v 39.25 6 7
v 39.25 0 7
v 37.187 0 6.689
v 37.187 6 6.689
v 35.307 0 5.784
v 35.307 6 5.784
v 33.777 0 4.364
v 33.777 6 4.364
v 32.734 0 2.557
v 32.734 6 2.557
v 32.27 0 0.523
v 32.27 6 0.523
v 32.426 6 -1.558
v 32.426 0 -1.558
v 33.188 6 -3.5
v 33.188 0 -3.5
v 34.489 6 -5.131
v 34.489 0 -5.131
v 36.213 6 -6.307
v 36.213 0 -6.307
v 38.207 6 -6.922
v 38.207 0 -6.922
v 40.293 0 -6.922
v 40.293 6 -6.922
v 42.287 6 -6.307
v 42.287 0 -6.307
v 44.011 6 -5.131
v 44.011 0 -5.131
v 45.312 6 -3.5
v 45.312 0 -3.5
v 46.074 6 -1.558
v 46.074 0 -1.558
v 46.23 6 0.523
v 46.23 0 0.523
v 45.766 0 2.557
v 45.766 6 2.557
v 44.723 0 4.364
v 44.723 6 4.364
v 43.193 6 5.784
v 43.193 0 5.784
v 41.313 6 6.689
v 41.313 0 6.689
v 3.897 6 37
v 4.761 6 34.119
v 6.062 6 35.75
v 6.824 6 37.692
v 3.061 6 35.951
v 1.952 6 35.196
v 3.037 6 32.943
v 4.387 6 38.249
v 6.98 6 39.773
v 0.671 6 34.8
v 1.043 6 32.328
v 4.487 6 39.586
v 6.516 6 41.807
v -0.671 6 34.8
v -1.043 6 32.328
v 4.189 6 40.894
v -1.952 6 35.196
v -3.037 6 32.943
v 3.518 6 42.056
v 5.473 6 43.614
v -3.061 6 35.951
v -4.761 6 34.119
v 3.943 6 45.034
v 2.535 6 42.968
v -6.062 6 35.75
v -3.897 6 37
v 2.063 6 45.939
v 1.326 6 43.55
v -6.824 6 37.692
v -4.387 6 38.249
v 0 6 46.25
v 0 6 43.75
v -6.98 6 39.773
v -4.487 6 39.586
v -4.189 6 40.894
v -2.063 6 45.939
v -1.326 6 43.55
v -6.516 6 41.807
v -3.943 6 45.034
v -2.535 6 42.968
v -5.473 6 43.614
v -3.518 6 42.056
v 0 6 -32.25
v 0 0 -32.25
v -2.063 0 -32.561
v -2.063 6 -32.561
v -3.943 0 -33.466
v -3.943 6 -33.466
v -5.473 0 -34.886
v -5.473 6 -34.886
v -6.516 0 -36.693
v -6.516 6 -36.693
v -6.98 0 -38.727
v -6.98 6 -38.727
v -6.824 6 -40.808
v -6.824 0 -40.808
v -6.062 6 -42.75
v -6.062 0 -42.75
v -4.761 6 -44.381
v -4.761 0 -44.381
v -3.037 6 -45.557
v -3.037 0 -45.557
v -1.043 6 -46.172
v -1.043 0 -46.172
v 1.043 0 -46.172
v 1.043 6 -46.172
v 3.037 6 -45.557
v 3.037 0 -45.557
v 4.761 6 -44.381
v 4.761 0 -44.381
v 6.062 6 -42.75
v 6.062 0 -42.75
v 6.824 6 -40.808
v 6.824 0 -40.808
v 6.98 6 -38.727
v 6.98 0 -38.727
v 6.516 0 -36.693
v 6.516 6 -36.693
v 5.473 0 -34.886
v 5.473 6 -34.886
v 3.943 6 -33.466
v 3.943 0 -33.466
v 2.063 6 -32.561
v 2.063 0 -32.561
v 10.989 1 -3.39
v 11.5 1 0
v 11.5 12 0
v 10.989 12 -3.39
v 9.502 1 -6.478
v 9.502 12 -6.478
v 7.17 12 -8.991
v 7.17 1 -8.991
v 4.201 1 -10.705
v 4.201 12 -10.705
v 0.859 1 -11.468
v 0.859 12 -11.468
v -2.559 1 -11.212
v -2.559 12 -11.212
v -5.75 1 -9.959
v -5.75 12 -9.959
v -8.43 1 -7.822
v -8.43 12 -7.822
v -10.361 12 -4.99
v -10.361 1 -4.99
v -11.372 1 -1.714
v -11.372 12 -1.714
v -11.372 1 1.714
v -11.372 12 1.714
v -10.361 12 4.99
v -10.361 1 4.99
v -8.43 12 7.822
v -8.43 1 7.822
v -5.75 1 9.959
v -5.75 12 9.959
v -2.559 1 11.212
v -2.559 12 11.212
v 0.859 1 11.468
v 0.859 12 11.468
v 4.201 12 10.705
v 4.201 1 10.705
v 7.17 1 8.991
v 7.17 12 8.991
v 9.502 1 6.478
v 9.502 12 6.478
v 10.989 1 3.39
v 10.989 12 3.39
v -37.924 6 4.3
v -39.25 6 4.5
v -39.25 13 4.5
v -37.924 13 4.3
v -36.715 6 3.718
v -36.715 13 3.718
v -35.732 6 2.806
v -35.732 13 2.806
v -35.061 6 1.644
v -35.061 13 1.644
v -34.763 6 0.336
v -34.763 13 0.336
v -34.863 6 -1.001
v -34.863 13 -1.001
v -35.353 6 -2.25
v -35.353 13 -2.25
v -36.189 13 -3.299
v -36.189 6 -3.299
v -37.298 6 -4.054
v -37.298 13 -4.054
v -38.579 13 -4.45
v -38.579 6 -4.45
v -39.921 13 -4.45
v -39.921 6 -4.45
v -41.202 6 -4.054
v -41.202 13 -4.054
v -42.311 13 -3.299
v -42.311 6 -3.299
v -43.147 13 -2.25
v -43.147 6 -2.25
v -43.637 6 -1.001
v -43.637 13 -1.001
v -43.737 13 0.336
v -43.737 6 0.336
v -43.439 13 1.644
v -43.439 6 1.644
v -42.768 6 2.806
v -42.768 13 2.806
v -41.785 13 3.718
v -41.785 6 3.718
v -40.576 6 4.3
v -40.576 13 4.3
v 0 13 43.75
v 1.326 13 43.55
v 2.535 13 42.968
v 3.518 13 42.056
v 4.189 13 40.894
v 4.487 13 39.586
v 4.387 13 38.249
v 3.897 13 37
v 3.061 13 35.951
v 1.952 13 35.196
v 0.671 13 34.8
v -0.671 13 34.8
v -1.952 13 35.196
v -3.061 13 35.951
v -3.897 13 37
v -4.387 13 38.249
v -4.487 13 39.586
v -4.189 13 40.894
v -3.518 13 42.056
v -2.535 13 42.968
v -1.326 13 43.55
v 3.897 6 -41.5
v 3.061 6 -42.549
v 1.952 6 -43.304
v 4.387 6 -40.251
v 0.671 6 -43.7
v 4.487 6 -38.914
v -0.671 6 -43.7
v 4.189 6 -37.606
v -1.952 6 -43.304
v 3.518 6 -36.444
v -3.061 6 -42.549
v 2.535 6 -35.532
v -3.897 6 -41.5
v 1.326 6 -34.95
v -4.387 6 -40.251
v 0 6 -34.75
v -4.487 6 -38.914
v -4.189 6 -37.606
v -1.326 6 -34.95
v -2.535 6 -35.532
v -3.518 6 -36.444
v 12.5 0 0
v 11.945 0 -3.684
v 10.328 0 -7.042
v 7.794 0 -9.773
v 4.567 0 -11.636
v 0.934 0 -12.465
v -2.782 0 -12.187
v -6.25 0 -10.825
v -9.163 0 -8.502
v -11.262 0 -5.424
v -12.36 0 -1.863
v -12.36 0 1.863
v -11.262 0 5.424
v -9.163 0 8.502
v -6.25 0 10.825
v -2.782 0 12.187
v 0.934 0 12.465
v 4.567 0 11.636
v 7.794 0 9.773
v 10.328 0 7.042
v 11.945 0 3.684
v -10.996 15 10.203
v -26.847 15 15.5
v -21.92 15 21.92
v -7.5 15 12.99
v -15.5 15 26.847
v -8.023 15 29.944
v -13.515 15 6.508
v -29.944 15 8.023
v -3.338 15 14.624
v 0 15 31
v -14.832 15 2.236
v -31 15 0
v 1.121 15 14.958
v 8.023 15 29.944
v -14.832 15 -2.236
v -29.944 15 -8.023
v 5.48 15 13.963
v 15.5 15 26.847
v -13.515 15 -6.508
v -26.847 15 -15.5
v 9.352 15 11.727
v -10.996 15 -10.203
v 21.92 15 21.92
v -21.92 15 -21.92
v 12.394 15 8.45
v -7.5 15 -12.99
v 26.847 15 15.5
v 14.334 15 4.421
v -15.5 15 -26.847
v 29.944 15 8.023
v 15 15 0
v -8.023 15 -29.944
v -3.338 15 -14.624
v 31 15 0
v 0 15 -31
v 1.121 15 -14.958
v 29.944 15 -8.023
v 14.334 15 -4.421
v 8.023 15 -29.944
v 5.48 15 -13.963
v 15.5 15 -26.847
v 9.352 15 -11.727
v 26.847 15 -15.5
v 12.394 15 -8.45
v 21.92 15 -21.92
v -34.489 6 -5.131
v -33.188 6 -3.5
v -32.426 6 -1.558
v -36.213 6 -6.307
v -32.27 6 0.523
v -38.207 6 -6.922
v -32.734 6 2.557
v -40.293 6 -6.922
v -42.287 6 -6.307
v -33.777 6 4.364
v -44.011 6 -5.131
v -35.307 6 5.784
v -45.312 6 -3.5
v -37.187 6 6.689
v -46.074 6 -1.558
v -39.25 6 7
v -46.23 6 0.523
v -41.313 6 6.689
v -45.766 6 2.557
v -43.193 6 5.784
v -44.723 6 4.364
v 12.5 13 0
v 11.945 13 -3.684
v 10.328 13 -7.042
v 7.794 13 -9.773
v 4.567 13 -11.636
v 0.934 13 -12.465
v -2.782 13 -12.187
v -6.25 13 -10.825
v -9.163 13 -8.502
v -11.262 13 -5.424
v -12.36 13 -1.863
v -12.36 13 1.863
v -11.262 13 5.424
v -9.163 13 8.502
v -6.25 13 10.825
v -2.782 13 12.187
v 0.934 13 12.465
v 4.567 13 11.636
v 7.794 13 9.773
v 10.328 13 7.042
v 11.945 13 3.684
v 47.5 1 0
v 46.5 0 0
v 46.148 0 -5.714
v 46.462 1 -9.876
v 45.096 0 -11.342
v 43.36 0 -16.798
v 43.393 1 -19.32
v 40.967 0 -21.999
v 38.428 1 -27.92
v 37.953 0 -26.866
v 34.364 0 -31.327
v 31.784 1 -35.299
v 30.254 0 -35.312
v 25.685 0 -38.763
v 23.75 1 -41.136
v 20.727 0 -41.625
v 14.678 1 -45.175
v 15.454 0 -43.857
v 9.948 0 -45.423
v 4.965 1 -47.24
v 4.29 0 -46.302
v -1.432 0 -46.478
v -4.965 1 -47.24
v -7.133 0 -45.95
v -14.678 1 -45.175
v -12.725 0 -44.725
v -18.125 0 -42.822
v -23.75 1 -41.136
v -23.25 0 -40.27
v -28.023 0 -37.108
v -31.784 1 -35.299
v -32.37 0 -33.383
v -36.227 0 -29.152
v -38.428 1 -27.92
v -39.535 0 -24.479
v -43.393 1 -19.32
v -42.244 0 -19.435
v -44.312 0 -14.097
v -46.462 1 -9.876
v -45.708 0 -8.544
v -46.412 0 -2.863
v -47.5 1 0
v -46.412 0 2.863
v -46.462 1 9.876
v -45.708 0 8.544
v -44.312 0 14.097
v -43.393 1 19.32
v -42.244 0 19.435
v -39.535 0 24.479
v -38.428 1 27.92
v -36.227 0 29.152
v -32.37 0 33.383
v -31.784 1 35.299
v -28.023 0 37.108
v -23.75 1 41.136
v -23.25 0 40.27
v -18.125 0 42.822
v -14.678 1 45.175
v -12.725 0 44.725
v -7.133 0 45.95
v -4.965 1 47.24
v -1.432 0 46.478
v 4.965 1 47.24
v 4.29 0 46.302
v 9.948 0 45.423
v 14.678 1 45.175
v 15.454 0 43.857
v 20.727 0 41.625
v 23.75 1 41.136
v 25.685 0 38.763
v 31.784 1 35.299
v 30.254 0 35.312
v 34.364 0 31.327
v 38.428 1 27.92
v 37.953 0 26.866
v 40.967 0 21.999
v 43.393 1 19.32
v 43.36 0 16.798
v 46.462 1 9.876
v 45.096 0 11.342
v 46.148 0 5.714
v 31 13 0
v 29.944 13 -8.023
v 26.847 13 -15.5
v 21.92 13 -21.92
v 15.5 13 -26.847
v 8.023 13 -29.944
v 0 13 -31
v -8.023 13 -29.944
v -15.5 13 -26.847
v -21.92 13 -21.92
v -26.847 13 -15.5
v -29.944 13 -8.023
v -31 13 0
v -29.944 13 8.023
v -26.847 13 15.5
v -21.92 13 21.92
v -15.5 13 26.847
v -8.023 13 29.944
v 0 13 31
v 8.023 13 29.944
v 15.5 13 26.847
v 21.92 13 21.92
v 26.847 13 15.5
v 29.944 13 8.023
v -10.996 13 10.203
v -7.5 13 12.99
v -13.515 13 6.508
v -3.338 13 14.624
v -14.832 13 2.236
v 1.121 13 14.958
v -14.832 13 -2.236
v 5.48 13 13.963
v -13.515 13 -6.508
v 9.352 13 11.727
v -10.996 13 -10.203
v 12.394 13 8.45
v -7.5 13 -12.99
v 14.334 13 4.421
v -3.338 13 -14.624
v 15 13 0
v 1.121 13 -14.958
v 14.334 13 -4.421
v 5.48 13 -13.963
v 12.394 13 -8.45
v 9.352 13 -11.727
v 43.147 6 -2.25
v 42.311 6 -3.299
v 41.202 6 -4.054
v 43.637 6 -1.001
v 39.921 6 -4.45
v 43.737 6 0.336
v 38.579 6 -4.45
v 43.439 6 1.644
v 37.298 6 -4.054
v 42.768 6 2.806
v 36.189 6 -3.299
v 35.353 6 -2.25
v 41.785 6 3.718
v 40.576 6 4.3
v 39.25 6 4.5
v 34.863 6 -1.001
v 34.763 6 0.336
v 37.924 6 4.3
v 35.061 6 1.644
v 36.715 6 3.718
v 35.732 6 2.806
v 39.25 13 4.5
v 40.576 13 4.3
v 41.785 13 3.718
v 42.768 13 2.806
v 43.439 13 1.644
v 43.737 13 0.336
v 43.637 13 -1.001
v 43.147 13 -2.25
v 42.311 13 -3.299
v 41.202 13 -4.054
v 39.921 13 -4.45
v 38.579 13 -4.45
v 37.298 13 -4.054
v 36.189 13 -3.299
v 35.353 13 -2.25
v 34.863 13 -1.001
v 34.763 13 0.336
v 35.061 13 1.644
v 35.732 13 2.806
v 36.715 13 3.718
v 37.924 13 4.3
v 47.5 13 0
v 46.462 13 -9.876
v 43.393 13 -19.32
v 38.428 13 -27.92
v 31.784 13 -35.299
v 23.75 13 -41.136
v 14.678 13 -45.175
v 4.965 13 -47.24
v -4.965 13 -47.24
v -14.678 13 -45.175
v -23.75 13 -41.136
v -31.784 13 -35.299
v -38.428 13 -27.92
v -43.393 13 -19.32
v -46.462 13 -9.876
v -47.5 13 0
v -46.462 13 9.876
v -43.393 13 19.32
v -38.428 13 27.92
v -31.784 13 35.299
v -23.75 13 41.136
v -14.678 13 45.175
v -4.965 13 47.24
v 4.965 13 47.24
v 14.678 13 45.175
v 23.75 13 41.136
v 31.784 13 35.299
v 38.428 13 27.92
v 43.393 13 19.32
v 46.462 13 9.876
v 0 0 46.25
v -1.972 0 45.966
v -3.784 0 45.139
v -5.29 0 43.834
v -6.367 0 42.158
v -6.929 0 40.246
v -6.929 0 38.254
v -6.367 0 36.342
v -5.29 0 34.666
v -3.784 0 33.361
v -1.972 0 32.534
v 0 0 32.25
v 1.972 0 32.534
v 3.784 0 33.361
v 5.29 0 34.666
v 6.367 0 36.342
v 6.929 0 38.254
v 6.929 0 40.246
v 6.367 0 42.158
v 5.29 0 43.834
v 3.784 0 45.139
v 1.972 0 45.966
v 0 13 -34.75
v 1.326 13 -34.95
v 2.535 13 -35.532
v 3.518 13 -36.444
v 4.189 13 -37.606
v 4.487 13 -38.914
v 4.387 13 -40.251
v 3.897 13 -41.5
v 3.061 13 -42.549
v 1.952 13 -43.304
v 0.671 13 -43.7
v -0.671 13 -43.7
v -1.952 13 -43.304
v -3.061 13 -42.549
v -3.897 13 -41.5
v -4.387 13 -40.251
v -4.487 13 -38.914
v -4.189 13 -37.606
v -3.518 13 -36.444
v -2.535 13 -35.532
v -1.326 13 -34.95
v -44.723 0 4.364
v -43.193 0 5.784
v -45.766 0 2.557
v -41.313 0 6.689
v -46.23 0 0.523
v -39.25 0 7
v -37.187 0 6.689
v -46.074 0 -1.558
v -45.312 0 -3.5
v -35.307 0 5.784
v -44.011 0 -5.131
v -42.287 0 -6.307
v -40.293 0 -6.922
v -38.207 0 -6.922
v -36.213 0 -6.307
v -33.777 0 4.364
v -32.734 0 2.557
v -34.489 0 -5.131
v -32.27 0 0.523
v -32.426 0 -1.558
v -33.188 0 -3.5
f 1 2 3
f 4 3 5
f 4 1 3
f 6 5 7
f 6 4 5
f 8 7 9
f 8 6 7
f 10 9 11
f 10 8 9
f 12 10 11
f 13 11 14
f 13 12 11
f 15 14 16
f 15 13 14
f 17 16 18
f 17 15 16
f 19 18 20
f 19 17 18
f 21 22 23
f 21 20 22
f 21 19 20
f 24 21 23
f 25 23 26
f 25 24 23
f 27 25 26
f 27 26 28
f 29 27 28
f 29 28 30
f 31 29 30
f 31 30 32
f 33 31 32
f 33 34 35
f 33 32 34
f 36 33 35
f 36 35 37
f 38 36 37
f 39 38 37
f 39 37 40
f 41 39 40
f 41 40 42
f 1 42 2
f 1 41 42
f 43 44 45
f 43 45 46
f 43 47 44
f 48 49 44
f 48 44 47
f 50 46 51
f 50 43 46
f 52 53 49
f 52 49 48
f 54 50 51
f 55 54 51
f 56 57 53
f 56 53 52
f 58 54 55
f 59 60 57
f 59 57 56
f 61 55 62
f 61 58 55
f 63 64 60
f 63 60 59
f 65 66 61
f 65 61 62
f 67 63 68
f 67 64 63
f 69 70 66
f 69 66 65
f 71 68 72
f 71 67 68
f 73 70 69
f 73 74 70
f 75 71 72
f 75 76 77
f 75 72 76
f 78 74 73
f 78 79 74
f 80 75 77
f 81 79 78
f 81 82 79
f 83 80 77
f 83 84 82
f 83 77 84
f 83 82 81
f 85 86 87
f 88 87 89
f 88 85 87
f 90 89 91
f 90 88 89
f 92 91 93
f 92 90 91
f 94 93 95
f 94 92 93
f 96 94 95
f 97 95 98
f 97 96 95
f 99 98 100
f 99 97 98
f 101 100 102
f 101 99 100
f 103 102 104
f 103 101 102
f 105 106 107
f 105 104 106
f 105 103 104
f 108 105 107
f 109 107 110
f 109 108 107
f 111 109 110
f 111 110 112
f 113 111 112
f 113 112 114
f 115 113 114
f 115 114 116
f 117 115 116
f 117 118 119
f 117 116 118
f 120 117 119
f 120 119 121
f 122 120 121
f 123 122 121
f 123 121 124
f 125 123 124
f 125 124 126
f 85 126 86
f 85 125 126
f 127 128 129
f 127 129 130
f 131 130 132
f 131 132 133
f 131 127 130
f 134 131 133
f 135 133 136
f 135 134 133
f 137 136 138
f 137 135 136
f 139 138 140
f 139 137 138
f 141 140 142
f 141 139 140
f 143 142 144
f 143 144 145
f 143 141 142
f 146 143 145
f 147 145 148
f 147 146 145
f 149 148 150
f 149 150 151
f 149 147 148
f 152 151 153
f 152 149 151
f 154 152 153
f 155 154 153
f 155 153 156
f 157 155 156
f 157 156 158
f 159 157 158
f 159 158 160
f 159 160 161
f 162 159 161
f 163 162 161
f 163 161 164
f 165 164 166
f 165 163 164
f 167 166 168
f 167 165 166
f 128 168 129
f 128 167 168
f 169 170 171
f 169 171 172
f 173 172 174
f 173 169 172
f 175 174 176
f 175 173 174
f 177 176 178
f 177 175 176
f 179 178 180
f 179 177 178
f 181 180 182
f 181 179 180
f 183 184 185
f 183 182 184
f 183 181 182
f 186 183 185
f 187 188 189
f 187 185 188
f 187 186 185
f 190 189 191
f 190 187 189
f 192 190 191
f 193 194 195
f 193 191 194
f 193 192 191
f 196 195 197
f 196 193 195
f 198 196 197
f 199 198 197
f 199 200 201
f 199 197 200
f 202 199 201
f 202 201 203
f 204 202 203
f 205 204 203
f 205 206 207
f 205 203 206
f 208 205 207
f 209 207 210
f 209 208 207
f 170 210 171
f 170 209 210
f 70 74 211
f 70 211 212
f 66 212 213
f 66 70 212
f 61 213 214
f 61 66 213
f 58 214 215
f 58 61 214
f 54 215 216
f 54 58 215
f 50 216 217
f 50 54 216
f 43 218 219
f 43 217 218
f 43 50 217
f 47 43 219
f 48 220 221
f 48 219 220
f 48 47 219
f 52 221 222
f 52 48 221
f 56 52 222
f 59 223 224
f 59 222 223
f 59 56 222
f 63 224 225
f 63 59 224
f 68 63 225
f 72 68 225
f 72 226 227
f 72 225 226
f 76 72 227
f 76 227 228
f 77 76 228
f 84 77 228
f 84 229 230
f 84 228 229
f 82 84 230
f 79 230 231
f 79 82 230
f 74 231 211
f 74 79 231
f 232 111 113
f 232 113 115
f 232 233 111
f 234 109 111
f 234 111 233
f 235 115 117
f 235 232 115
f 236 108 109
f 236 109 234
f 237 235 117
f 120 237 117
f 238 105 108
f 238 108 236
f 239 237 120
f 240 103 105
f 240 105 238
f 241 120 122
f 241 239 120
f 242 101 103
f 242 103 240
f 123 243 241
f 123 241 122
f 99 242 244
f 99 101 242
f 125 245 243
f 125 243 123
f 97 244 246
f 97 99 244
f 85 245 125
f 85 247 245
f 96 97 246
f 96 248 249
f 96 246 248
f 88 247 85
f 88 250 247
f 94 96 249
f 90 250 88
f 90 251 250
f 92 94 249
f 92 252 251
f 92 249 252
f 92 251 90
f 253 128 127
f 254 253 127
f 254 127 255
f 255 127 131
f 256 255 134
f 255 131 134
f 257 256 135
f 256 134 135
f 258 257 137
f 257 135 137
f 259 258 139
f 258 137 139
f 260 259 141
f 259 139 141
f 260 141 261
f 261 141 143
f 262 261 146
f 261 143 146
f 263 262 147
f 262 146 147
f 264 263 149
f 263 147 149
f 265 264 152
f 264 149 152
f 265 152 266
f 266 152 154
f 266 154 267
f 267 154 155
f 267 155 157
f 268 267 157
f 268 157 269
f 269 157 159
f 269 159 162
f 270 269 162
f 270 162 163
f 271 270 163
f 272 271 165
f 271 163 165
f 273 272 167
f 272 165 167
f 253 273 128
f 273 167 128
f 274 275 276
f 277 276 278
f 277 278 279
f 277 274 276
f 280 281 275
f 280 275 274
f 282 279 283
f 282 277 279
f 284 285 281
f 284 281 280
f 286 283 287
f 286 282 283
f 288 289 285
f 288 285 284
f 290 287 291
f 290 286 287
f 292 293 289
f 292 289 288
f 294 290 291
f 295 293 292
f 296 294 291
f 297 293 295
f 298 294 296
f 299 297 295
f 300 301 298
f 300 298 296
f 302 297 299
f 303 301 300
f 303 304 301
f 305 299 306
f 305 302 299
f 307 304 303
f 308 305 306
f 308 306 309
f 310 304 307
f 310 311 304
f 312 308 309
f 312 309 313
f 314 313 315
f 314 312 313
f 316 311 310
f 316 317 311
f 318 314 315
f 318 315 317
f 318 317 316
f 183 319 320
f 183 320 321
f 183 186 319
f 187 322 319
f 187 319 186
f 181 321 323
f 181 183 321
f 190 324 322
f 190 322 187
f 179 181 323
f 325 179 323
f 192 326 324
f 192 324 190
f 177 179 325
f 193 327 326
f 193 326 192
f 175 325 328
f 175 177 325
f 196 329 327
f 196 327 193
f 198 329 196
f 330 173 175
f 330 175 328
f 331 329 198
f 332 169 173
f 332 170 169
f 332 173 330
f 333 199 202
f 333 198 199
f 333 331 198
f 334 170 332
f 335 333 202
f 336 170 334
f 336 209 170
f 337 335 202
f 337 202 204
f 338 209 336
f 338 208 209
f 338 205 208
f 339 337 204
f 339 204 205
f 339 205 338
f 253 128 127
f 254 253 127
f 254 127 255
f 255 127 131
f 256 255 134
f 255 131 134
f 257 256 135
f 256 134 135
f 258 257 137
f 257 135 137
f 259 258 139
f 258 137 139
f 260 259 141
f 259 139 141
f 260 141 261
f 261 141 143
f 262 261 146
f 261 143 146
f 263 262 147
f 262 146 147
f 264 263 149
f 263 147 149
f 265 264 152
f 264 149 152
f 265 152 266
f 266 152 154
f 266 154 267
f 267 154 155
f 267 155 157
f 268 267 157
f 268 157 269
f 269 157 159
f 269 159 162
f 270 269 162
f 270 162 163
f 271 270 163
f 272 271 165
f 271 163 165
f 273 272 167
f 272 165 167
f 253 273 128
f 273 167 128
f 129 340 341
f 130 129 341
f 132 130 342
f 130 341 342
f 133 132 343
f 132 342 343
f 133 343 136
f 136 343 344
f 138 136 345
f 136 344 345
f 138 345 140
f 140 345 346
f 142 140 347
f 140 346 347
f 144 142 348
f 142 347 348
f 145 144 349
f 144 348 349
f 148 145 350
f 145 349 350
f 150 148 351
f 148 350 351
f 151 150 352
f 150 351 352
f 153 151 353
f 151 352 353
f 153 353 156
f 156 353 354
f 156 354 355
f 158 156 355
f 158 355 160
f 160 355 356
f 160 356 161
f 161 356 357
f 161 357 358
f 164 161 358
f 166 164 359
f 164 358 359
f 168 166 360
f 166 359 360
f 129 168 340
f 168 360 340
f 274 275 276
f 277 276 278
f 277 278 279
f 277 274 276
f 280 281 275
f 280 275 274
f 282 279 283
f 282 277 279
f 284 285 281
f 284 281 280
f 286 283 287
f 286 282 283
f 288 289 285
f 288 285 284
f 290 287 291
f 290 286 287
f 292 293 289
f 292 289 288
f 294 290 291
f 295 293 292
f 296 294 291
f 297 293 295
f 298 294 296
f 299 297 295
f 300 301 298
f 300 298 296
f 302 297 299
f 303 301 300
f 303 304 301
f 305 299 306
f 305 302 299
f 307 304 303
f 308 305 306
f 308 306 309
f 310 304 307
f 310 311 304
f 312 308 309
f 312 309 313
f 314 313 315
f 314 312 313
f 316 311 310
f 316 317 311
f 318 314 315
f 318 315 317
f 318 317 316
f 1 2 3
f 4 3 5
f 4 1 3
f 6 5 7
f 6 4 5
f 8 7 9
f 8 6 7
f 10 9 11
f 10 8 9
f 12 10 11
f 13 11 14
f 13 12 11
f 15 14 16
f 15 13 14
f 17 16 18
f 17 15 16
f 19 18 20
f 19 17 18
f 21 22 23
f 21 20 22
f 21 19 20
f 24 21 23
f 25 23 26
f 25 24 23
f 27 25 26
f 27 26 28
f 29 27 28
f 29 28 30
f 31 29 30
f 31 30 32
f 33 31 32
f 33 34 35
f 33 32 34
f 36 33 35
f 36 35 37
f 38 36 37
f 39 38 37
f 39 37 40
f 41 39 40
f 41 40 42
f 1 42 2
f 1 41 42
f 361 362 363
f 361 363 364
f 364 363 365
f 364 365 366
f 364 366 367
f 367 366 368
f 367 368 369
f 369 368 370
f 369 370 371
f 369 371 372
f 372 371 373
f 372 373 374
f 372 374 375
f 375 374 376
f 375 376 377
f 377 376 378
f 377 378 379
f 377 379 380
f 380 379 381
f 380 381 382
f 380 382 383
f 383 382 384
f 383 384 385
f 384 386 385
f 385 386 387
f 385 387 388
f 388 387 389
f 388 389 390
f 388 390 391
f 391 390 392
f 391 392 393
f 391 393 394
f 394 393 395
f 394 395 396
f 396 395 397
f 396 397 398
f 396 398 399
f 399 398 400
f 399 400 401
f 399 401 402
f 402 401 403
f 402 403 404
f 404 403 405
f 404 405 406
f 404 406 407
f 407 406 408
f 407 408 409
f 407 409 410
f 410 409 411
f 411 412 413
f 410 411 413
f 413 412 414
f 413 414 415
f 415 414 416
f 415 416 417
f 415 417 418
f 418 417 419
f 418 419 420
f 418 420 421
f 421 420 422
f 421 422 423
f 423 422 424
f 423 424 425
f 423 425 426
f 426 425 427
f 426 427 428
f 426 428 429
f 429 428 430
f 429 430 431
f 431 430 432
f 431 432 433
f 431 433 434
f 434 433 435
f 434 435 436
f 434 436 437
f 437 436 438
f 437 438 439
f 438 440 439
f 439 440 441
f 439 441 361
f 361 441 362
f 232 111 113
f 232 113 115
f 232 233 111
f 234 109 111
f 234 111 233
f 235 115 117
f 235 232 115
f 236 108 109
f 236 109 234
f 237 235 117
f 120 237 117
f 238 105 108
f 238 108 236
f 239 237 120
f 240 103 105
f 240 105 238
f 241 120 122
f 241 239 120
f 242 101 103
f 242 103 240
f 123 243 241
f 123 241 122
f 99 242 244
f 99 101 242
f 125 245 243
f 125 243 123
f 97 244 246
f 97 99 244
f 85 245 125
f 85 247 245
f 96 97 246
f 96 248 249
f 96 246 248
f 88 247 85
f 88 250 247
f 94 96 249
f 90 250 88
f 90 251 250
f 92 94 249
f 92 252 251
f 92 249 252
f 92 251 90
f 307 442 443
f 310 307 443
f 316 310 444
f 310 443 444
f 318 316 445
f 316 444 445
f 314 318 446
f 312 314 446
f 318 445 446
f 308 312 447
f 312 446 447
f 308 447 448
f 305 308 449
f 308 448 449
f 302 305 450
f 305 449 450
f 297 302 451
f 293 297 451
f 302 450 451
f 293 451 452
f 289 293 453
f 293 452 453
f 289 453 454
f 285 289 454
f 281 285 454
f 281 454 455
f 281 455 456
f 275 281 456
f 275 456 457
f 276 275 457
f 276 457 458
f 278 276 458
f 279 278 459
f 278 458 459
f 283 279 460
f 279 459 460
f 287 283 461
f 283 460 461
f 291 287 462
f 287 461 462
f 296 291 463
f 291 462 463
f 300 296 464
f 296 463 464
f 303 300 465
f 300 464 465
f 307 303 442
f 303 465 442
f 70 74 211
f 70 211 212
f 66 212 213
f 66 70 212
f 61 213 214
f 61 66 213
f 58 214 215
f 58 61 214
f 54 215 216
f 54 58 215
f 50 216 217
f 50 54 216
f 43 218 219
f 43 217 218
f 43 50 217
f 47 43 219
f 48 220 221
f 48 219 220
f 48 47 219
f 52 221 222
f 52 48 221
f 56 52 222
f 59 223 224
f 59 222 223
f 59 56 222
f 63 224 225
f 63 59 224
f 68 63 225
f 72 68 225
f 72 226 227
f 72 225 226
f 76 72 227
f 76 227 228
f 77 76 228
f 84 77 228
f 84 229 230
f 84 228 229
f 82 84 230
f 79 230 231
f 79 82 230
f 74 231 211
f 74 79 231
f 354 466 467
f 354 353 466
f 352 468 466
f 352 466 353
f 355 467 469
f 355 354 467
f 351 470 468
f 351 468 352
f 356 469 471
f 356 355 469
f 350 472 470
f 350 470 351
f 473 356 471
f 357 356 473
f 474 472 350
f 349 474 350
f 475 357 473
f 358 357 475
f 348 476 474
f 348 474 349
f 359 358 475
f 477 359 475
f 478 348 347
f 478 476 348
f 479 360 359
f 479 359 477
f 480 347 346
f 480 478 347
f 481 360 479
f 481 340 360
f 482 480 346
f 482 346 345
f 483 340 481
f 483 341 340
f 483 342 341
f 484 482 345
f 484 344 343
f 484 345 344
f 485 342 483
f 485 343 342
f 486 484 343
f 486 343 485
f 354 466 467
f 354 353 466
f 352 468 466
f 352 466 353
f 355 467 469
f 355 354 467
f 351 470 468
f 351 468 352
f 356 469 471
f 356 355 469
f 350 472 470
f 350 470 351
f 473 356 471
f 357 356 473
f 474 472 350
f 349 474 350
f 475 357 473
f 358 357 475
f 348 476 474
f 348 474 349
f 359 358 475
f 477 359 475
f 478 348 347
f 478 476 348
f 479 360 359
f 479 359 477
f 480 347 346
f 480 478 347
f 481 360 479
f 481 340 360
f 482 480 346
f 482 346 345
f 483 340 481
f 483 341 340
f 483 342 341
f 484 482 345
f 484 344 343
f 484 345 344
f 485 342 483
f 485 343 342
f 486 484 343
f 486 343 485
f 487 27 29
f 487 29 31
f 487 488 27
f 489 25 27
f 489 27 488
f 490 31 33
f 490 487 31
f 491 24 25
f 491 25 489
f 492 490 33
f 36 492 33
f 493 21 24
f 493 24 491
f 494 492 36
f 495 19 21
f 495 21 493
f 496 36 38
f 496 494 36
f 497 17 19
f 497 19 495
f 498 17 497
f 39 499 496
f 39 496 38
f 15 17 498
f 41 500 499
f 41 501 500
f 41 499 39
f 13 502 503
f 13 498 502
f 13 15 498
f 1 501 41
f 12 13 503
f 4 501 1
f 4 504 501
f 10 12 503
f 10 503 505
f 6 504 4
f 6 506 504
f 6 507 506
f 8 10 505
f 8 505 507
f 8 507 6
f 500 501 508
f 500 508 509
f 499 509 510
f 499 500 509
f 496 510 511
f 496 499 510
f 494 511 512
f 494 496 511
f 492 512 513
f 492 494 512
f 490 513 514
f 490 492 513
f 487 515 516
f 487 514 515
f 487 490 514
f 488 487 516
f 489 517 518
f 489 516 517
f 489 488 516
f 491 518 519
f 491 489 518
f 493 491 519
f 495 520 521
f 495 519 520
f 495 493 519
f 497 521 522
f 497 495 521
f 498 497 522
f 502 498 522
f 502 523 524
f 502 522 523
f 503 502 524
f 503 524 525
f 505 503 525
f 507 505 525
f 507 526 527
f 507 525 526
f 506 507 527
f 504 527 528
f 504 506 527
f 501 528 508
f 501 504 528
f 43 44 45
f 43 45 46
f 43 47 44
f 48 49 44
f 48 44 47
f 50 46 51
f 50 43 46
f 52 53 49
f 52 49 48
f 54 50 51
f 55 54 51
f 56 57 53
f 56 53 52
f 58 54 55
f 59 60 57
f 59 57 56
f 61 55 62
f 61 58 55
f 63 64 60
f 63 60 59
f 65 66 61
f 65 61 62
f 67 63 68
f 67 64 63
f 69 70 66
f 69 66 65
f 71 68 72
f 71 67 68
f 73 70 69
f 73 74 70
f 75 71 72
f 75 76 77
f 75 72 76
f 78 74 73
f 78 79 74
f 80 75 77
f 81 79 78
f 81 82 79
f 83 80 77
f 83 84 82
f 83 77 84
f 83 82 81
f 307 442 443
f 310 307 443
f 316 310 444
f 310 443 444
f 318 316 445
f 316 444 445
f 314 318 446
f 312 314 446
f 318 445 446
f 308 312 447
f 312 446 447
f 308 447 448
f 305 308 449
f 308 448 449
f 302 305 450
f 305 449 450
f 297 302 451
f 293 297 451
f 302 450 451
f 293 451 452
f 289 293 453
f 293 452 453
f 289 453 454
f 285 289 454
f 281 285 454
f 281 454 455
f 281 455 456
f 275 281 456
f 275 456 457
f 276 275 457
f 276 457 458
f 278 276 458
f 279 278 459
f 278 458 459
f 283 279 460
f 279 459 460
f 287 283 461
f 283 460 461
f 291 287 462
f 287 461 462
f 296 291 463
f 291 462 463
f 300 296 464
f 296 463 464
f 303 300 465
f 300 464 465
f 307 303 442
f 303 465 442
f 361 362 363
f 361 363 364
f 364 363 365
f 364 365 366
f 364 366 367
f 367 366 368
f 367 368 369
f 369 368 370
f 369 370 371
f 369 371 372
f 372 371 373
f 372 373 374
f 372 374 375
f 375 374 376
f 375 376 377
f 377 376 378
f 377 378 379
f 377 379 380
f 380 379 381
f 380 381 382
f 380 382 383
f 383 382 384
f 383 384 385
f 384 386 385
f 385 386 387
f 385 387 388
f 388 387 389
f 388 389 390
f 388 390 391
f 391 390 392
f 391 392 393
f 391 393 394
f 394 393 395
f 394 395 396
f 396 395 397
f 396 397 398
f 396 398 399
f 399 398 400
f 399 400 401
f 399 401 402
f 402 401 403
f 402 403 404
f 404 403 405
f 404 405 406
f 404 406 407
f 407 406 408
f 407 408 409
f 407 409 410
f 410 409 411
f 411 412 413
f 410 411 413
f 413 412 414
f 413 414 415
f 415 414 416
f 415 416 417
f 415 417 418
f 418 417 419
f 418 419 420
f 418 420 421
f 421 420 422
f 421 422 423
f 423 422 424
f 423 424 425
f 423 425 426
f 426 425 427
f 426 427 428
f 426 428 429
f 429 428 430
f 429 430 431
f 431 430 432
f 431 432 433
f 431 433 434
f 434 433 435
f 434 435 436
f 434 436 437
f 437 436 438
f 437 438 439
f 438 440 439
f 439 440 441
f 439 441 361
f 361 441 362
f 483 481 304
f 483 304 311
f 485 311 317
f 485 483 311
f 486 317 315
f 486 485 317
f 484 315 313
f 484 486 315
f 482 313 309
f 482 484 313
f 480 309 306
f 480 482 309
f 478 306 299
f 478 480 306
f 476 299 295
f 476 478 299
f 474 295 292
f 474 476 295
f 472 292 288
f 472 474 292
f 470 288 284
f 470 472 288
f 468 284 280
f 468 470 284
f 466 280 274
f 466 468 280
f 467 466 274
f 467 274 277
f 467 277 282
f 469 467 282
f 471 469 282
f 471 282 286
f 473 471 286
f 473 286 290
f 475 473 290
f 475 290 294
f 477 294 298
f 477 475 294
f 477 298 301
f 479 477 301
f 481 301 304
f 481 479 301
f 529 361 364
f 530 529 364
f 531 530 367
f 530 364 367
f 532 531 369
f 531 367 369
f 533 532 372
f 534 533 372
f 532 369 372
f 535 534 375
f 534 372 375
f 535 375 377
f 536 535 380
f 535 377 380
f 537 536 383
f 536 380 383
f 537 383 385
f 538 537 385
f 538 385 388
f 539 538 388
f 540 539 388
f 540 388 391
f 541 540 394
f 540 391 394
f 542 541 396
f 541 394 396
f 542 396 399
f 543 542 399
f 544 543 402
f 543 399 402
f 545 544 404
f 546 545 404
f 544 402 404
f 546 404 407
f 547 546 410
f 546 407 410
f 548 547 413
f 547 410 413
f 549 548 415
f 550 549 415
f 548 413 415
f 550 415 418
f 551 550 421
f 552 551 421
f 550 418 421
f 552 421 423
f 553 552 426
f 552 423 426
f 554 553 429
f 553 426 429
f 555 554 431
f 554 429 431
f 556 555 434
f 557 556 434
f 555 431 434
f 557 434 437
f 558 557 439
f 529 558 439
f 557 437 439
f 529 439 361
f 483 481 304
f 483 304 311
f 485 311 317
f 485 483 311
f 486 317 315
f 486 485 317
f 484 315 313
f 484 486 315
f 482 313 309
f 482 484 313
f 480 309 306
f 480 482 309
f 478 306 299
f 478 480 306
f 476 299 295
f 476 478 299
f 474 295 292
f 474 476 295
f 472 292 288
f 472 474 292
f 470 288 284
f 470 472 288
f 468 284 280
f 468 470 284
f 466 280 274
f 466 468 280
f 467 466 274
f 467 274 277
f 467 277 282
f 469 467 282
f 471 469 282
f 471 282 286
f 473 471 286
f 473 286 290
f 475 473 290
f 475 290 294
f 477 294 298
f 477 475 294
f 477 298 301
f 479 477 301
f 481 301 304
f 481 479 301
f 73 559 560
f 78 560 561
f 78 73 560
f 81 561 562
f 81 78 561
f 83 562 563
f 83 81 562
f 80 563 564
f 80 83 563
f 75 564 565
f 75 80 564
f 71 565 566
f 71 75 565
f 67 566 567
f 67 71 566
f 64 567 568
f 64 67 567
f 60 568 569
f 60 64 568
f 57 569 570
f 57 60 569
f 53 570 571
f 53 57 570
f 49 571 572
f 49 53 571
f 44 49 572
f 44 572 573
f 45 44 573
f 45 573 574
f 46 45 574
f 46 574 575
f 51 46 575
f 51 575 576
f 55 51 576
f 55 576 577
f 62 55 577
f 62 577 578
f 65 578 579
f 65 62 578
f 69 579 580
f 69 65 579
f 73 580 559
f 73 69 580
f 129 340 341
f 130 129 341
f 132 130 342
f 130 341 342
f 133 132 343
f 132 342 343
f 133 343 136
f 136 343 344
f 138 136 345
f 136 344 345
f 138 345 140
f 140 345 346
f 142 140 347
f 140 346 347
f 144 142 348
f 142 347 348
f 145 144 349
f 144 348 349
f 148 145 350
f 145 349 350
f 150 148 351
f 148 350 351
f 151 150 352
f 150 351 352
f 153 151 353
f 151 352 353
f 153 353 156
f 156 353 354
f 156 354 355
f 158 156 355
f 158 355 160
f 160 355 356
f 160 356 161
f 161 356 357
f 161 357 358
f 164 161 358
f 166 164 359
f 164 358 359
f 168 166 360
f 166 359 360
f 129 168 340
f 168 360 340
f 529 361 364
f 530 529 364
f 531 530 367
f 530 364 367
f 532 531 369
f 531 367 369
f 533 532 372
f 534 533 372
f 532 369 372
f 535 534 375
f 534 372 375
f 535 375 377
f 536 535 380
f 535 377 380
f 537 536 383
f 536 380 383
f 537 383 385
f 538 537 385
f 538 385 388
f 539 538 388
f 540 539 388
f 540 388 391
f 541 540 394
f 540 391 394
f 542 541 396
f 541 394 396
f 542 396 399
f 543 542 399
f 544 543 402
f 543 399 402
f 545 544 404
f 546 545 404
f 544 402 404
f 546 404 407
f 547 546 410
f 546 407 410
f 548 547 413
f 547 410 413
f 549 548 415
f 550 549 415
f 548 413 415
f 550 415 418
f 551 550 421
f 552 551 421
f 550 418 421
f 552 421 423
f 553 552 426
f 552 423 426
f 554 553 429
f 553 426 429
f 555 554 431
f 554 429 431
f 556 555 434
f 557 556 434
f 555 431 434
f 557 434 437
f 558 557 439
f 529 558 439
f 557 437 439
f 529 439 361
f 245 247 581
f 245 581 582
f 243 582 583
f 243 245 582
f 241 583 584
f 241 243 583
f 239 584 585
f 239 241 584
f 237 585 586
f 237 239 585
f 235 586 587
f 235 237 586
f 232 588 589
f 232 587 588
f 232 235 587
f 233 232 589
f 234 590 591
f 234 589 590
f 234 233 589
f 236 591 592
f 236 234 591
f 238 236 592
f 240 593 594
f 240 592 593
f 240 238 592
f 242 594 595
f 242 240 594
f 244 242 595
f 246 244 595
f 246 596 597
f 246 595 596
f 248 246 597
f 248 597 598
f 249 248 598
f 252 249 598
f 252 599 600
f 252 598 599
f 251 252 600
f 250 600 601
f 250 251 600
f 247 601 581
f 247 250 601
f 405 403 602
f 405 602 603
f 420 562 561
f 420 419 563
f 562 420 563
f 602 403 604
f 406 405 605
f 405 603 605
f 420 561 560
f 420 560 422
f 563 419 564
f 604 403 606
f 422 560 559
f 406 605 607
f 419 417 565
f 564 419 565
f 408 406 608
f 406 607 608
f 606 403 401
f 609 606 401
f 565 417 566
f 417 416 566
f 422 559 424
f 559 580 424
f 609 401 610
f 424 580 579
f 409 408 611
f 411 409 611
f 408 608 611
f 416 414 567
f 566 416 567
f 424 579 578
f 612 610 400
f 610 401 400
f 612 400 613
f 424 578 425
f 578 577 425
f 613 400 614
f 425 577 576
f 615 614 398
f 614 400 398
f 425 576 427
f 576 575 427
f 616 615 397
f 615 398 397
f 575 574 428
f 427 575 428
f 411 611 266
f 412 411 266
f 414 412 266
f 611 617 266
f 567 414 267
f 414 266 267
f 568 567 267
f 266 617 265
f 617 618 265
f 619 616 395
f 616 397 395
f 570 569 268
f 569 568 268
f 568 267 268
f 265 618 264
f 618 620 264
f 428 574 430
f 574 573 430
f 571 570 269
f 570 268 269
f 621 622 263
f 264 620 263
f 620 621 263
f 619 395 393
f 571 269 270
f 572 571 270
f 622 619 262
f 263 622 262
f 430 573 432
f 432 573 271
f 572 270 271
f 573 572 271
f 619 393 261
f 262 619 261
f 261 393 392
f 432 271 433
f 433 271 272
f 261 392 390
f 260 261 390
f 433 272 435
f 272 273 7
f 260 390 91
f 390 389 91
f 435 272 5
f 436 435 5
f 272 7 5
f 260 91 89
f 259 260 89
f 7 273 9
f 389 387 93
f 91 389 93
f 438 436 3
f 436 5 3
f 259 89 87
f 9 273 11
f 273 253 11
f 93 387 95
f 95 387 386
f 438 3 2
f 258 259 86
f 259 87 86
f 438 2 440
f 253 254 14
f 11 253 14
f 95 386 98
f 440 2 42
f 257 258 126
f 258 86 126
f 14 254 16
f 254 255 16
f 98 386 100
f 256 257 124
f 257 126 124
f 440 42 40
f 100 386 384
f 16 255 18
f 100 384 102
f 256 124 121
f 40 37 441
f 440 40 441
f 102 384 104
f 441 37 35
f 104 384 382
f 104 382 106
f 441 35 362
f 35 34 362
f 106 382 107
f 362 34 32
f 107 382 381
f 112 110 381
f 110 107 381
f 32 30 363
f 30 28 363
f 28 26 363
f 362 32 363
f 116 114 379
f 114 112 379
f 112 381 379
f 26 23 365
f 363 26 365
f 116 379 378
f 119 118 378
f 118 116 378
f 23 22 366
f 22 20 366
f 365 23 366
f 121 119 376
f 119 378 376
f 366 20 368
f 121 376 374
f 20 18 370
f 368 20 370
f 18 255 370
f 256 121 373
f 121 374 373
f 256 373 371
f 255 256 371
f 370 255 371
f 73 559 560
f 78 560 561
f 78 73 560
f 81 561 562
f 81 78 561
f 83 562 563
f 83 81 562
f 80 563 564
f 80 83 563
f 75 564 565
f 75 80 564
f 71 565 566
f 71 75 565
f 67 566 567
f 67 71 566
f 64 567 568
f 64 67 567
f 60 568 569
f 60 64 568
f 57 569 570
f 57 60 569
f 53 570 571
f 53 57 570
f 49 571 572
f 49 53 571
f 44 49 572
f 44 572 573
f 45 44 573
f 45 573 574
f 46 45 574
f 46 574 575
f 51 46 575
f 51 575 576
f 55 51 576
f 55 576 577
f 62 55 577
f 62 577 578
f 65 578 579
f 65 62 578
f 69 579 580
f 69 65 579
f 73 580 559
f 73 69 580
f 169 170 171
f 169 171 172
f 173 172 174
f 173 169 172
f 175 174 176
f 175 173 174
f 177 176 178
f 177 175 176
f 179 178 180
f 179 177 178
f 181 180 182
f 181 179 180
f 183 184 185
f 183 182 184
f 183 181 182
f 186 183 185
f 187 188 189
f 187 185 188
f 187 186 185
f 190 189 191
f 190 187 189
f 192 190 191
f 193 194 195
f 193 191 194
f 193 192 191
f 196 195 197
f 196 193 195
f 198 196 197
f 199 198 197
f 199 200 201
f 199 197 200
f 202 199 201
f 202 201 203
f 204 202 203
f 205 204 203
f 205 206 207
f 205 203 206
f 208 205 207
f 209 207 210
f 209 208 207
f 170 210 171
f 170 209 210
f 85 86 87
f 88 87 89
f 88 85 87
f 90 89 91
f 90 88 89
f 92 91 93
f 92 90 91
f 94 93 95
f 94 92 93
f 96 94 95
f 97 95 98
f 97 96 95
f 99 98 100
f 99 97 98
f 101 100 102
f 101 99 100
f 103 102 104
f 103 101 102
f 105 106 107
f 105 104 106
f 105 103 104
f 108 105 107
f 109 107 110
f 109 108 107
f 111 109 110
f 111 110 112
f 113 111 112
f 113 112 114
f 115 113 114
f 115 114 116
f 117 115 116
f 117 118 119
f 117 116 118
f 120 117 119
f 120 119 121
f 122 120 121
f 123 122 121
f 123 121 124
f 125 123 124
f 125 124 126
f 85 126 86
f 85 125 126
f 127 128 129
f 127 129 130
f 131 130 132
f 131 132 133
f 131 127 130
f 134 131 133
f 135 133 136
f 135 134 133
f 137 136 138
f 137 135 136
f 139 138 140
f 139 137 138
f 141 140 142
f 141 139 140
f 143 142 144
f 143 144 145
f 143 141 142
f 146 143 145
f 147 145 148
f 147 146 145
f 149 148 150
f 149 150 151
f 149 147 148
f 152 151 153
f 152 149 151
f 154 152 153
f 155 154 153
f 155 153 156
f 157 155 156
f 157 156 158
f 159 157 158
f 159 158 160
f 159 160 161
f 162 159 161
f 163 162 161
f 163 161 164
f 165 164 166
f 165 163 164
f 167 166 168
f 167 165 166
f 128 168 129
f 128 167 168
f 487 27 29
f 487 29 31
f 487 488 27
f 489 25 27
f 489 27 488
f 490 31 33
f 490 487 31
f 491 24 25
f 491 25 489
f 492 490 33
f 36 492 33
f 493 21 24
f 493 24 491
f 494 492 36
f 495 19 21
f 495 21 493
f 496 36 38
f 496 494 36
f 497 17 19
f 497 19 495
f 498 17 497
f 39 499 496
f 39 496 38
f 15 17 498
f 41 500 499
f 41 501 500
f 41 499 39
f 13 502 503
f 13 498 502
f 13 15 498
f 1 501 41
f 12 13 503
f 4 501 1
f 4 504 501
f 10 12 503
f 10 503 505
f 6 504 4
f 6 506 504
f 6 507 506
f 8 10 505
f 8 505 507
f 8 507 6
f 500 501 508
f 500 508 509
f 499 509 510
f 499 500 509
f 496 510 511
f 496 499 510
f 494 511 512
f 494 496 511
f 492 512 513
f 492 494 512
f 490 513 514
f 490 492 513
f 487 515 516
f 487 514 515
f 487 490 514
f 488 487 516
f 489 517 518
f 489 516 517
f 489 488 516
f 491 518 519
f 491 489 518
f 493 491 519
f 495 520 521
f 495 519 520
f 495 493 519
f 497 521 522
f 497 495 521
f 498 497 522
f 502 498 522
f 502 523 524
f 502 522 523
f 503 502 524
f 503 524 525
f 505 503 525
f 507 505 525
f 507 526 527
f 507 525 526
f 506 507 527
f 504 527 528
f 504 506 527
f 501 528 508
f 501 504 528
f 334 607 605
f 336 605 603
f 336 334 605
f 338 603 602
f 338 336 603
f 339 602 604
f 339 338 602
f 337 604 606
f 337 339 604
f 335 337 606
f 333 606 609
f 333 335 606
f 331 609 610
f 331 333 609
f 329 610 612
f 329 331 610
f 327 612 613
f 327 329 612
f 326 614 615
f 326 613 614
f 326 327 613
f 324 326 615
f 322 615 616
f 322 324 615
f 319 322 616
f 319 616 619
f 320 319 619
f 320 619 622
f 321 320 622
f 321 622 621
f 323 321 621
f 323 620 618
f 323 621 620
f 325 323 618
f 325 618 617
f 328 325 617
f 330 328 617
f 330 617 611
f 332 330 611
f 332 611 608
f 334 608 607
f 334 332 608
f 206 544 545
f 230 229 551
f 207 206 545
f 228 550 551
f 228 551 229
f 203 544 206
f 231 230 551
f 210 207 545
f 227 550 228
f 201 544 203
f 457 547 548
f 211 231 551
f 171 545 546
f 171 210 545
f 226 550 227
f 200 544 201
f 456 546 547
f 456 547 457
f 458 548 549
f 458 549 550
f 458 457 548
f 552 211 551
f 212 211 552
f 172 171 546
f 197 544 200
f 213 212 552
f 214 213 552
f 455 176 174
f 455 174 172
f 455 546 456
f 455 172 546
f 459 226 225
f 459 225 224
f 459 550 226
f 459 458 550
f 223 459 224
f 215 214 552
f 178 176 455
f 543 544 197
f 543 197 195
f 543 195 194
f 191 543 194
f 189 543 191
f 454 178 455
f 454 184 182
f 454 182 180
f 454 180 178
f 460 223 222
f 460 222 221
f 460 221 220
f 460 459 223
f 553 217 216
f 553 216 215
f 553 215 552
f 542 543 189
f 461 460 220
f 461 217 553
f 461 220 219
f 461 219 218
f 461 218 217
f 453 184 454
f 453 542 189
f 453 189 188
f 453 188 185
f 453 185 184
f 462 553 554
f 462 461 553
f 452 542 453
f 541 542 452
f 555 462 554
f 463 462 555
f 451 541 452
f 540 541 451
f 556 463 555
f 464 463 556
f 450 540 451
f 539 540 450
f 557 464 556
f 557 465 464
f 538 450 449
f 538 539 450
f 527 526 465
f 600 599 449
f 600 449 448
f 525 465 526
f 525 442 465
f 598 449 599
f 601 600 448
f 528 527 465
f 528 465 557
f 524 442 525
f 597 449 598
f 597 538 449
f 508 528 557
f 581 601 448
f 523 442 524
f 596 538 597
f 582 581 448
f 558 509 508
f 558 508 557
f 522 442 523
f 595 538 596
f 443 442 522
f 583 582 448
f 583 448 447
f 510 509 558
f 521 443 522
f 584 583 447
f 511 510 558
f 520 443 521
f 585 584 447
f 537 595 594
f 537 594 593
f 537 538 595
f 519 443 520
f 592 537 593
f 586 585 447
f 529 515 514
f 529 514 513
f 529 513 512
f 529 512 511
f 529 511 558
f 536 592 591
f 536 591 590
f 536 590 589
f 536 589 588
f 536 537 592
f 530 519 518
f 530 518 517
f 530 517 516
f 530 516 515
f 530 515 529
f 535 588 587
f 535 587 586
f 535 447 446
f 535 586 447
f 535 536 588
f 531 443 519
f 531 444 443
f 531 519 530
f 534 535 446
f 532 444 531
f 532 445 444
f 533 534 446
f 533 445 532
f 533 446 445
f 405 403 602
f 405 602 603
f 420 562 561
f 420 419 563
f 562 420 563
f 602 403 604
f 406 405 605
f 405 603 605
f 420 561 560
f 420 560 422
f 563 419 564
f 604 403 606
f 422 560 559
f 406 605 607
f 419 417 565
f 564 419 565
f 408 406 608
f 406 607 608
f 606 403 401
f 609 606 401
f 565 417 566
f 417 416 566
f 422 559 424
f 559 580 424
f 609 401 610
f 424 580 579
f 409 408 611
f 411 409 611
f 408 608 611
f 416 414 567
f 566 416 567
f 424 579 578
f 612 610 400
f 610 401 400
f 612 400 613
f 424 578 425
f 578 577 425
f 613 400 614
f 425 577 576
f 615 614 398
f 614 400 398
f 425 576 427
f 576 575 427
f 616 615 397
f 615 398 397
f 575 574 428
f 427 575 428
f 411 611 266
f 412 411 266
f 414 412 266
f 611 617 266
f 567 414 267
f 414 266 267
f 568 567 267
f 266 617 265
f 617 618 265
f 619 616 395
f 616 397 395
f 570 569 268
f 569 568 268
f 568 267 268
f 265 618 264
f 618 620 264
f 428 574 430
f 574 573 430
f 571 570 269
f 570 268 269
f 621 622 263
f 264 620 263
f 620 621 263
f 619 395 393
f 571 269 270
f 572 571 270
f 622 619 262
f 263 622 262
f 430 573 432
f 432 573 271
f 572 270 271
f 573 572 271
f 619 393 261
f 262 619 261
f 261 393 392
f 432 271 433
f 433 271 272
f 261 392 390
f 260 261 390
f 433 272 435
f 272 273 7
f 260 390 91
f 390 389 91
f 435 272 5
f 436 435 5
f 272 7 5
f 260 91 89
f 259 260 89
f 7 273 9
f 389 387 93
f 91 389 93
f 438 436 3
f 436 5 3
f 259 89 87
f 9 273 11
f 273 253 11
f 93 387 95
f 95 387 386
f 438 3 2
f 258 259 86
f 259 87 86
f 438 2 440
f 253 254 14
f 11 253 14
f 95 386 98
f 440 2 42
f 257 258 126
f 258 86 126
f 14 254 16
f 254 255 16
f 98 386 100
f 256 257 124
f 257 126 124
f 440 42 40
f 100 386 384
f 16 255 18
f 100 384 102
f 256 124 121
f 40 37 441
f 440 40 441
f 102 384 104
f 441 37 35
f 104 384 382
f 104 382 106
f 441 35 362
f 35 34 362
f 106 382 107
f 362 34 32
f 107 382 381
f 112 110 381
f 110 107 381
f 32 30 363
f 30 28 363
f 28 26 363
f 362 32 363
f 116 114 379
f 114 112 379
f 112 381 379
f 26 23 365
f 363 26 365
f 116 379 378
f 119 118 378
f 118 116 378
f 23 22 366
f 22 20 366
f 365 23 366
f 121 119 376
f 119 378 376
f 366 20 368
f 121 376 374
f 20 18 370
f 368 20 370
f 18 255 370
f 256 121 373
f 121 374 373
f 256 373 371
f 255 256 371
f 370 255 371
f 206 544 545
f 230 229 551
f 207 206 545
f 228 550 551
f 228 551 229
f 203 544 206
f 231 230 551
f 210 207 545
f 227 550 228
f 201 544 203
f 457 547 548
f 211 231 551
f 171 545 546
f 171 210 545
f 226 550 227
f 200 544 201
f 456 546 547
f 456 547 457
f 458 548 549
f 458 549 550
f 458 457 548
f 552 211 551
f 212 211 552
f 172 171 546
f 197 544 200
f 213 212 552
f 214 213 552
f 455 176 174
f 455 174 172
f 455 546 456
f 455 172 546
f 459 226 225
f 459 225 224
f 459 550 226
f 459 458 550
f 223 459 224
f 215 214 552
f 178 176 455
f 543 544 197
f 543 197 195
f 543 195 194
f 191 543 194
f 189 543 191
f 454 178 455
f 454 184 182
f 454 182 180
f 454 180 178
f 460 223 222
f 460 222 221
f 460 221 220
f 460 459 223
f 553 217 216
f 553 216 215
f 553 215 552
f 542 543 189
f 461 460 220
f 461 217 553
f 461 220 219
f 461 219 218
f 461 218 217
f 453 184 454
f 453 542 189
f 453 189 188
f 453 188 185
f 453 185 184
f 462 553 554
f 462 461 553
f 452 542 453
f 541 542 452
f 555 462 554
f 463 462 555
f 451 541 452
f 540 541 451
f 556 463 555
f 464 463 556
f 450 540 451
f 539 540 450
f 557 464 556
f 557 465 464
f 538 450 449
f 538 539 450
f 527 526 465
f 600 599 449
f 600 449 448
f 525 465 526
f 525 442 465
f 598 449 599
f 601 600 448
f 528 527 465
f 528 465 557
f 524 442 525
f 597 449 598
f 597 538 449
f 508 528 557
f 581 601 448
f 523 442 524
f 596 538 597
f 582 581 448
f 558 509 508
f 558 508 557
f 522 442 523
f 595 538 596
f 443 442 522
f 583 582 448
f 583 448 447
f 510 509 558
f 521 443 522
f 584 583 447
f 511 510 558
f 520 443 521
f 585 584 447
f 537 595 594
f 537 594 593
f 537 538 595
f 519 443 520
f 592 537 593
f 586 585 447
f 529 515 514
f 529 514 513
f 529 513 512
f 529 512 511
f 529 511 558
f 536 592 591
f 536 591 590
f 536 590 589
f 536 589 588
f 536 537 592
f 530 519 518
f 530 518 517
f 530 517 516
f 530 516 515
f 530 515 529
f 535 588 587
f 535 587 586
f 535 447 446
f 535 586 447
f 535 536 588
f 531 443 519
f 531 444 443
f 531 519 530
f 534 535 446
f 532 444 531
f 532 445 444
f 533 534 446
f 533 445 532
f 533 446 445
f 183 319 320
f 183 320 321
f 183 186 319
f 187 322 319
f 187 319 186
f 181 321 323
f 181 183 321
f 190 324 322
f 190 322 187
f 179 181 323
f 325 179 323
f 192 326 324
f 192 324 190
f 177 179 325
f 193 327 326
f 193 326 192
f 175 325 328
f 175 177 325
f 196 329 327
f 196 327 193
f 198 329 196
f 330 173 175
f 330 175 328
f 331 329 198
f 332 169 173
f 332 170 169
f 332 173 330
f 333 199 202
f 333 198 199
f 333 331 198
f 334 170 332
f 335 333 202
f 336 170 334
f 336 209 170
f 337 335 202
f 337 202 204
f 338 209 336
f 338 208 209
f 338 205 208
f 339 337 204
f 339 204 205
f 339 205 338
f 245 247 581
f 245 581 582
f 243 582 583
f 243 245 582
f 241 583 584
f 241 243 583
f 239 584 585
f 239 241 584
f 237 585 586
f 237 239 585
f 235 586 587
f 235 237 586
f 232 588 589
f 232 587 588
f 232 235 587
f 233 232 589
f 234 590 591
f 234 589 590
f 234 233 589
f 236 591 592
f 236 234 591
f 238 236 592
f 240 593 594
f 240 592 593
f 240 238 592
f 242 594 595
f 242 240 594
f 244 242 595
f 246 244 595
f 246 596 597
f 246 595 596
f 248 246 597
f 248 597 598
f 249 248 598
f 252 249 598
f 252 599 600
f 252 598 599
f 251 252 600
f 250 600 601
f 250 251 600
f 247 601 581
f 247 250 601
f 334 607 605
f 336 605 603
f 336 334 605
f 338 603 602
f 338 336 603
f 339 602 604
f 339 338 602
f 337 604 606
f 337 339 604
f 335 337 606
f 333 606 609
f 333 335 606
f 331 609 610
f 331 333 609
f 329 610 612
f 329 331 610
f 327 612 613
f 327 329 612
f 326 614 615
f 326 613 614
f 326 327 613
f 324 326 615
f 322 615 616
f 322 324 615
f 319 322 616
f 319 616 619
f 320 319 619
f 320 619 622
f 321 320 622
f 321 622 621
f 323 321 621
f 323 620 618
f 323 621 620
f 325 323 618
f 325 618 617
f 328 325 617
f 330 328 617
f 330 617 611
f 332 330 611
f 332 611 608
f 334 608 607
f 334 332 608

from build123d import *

# Parameters (mm, degrees)
REVOLVE_1_OUTLINE_R      = 47.5
REVOLVE_1_OUTLINE_R_2    = 11.5
REVOLVE_1_DEPTH          = 13
REVOLVE_START            = 13
REVOLVE_1_2_OUTLINE_R    = 31
REVOLVE_1_2_OUTLINE_R_2  = 15
REVOLVE_1_2_DEPTH        = 2
REVOLVE_1_3_OUTLINE_R    = 47.5
REVOLVE_1_3_OUTLINE_R_2  = 11.5
REVOLVE_1_3_DEPTH        = 13
REVOLVE_1_4_OUTLINE_R    = 31
REVOLVE_1_4_OUTLINE_R_2  = 15
REVOLVE_1_4_DEPTH        = 2
CUT_EXTRUDE_2_DEPTH      = 69.421487853
CUT_EXTRUDE_2_DEPTH_BACK = 69.421487853
SKETCH_2_R               = 4.5
CUT_EXTRUDE_3_DEPTH      = 69.82949949
CUT_EXTRUDE_3_DEPTH_BACK = 6
SKETCH_5_R               = 7
CHAMFER_2_SIZE           = 1
CHAMFER_3_SIZE           = 1
CHAMFER_4_SIZE           = 1


# Read off the part's stored shape, not the designer's step: 旋转1
with BuildPart() as part:
    # 旋转1 outline → 旋转1 (new body)
    with BuildSketch(Plane(origin=(0, 0, 0), x_dir=(1, 0, 0), z_dir=(0, 1, 0))):
        Circle(REVOLVE_1_OUTLINE_R)
        Circle(REVOLVE_1_OUTLINE_R_2, mode=Mode.SUBTRACT)
    extrude(amount=REVOLVE_1_DEPTH)

    # Revolve 1 2 outline → Revolve 1 2 (add)
    with BuildSketch(Plane(origin=(0, 0, 0), x_dir=(1, 0, 0), z_dir=(0, 1, 0)).offset(REVOLVE_START)):
        Circle(REVOLVE_1_2_OUTLINE_R)
        Circle(REVOLVE_1_2_OUTLINE_R_2, mode=Mode.SUBTRACT)
    extrude(amount=REVOLVE_1_2_DEPTH)


with BuildPart() as body_2:
    # Revolve 1 3 outline → Revolve 1 3 (new body)
    with BuildSketch(Plane(origin=(0, 0, 0), x_dir=(1, 0, 0), z_dir=(0, 1, 0))):
        Circle(REVOLVE_1_3_OUTLINE_R)
        Circle(REVOLVE_1_3_OUTLINE_R_2, mode=Mode.SUBTRACT)
    extrude(amount=REVOLVE_1_3_DEPTH)

    # Revolve 1 4 outline → Revolve 1 4 (add)
    with BuildSketch(Plane(origin=(0, 0, 0), x_dir=(1, 0, 0), z_dir=(0, 1, 0)).offset(REVOLVE_START)):
        Circle(REVOLVE_1_4_OUTLINE_R)
        Circle(REVOLVE_1_4_OUTLINE_R_2, mode=Mode.SUBTRACT)
    extrude(amount=REVOLVE_1_4_DEPTH)


with BuildPart() as cut_extrude_2_tool:
    # 草图2 → 切除-拉伸2 (new, two sides: drawn at the far end of the back side and taken through both)
    with BuildSketch(Plane(origin=(0, 13, 0), x_dir=(1, 0, 0), z_dir=(0, 1, 0)).offset(-CUT_EXTRUDE_2_DEPTH_BACK)):
        with Locations(Location((0, 39.25, 0), (0, 0, 270))):
            Circle(SKETCH_2_R)
        with Locations(Location((39.25, 0, 0), (0, 0, 270))):
            Circle(SKETCH_2_R)
        with Locations(Location((0, -39.25, 0), (0, 0, 270))):
            Circle(SKETCH_2_R)
        with Locations(Location((-39.25, 0, 0), (0, 0, 270))):
            Circle(SKETCH_2_R)
    extrude(amount=CUT_EXTRUDE_2_DEPTH + CUT_EXTRUDE_2_DEPTH_BACK)


with BuildPart() as part_1:
    add(part.part)

    # 切除-拉伸2: cut by cut_extrude_2_tool
    add(cut_extrude_2_tool.part, mode=Mode.SUBTRACT)


with BuildPart() as body_2_1:
    add(body_2.part)

    # 切除-拉伸2: cut by cut_extrude_2_tool
    add(cut_extrude_2_tool.part, mode=Mode.SUBTRACT)


with BuildPart() as cut_extrude_3_tool:
    # 草图5 → 切除-拉伸3 (new, two sides: drawn at the far end of the back side and taken through both)
    with BuildSketch(Plane.XZ.offset(-CUT_EXTRUDE_3_DEPTH_BACK)):
        with Locations(Location((0, 39.25, 0), (0, 0, 90))):
            Circle(SKETCH_5_R)
        with Locations(Location((39.25, 0, 0), (0, 0, 90))):
            Circle(SKETCH_5_R)
        with Locations(Location((0, -39.25, 0), (0, 0, 90))):
            Circle(SKETCH_5_R)
        with Locations(Location((-39.25, 0, 0), (0, 0, 90))):
            Circle(SKETCH_5_R)
    extrude(amount=CUT_EXTRUDE_3_DEPTH + CUT_EXTRUDE_3_DEPTH_BACK)


with BuildPart() as part_2:
    add(part_1.part)

    # 切除-拉伸3: cut by cut_extrude_3_tool
    add(cut_extrude_3_tool.part, mode=Mode.SUBTRACT)

    # 倒角2
    chamfer_2_edges = [part_2.edges().sort_by_distance(p)[0] for p in [
        (-11.5, 0, 0),
        (-11.5, 13, 0),
        (-47.5, 0, 0),
    ]]
    chamfer(chamfer_2_edges, length=CHAMFER_2_SIZE)


with BuildPart() as body_2_2:
    add(body_2_1.part)

    # 切除-拉伸3: cut by cut_extrude_3_tool
    add(cut_extrude_3_tool.part, mode=Mode.SUBTRACT)

    # 倒角3
    chamfer_3_edges = [body_2_2.edges().sort_by_distance(p)[0] for p in [
        (-47.5, 0, 0),
    ]]
    chamfer(chamfer_3_edges, length=CHAMFER_3_SIZE)

    # 倒角4
    chamfer_4_edges = [body_2_2.edges().sort_by_distance(p)[0] for p in [
        (-11.5, 13, 0),
        (-11.5, 0, 0),
    ]]
    chamfer(chamfer_4_edges, length=CHAMFER_4_SIZE)


solid = Compound([part_2.part, body_2_2.part])
